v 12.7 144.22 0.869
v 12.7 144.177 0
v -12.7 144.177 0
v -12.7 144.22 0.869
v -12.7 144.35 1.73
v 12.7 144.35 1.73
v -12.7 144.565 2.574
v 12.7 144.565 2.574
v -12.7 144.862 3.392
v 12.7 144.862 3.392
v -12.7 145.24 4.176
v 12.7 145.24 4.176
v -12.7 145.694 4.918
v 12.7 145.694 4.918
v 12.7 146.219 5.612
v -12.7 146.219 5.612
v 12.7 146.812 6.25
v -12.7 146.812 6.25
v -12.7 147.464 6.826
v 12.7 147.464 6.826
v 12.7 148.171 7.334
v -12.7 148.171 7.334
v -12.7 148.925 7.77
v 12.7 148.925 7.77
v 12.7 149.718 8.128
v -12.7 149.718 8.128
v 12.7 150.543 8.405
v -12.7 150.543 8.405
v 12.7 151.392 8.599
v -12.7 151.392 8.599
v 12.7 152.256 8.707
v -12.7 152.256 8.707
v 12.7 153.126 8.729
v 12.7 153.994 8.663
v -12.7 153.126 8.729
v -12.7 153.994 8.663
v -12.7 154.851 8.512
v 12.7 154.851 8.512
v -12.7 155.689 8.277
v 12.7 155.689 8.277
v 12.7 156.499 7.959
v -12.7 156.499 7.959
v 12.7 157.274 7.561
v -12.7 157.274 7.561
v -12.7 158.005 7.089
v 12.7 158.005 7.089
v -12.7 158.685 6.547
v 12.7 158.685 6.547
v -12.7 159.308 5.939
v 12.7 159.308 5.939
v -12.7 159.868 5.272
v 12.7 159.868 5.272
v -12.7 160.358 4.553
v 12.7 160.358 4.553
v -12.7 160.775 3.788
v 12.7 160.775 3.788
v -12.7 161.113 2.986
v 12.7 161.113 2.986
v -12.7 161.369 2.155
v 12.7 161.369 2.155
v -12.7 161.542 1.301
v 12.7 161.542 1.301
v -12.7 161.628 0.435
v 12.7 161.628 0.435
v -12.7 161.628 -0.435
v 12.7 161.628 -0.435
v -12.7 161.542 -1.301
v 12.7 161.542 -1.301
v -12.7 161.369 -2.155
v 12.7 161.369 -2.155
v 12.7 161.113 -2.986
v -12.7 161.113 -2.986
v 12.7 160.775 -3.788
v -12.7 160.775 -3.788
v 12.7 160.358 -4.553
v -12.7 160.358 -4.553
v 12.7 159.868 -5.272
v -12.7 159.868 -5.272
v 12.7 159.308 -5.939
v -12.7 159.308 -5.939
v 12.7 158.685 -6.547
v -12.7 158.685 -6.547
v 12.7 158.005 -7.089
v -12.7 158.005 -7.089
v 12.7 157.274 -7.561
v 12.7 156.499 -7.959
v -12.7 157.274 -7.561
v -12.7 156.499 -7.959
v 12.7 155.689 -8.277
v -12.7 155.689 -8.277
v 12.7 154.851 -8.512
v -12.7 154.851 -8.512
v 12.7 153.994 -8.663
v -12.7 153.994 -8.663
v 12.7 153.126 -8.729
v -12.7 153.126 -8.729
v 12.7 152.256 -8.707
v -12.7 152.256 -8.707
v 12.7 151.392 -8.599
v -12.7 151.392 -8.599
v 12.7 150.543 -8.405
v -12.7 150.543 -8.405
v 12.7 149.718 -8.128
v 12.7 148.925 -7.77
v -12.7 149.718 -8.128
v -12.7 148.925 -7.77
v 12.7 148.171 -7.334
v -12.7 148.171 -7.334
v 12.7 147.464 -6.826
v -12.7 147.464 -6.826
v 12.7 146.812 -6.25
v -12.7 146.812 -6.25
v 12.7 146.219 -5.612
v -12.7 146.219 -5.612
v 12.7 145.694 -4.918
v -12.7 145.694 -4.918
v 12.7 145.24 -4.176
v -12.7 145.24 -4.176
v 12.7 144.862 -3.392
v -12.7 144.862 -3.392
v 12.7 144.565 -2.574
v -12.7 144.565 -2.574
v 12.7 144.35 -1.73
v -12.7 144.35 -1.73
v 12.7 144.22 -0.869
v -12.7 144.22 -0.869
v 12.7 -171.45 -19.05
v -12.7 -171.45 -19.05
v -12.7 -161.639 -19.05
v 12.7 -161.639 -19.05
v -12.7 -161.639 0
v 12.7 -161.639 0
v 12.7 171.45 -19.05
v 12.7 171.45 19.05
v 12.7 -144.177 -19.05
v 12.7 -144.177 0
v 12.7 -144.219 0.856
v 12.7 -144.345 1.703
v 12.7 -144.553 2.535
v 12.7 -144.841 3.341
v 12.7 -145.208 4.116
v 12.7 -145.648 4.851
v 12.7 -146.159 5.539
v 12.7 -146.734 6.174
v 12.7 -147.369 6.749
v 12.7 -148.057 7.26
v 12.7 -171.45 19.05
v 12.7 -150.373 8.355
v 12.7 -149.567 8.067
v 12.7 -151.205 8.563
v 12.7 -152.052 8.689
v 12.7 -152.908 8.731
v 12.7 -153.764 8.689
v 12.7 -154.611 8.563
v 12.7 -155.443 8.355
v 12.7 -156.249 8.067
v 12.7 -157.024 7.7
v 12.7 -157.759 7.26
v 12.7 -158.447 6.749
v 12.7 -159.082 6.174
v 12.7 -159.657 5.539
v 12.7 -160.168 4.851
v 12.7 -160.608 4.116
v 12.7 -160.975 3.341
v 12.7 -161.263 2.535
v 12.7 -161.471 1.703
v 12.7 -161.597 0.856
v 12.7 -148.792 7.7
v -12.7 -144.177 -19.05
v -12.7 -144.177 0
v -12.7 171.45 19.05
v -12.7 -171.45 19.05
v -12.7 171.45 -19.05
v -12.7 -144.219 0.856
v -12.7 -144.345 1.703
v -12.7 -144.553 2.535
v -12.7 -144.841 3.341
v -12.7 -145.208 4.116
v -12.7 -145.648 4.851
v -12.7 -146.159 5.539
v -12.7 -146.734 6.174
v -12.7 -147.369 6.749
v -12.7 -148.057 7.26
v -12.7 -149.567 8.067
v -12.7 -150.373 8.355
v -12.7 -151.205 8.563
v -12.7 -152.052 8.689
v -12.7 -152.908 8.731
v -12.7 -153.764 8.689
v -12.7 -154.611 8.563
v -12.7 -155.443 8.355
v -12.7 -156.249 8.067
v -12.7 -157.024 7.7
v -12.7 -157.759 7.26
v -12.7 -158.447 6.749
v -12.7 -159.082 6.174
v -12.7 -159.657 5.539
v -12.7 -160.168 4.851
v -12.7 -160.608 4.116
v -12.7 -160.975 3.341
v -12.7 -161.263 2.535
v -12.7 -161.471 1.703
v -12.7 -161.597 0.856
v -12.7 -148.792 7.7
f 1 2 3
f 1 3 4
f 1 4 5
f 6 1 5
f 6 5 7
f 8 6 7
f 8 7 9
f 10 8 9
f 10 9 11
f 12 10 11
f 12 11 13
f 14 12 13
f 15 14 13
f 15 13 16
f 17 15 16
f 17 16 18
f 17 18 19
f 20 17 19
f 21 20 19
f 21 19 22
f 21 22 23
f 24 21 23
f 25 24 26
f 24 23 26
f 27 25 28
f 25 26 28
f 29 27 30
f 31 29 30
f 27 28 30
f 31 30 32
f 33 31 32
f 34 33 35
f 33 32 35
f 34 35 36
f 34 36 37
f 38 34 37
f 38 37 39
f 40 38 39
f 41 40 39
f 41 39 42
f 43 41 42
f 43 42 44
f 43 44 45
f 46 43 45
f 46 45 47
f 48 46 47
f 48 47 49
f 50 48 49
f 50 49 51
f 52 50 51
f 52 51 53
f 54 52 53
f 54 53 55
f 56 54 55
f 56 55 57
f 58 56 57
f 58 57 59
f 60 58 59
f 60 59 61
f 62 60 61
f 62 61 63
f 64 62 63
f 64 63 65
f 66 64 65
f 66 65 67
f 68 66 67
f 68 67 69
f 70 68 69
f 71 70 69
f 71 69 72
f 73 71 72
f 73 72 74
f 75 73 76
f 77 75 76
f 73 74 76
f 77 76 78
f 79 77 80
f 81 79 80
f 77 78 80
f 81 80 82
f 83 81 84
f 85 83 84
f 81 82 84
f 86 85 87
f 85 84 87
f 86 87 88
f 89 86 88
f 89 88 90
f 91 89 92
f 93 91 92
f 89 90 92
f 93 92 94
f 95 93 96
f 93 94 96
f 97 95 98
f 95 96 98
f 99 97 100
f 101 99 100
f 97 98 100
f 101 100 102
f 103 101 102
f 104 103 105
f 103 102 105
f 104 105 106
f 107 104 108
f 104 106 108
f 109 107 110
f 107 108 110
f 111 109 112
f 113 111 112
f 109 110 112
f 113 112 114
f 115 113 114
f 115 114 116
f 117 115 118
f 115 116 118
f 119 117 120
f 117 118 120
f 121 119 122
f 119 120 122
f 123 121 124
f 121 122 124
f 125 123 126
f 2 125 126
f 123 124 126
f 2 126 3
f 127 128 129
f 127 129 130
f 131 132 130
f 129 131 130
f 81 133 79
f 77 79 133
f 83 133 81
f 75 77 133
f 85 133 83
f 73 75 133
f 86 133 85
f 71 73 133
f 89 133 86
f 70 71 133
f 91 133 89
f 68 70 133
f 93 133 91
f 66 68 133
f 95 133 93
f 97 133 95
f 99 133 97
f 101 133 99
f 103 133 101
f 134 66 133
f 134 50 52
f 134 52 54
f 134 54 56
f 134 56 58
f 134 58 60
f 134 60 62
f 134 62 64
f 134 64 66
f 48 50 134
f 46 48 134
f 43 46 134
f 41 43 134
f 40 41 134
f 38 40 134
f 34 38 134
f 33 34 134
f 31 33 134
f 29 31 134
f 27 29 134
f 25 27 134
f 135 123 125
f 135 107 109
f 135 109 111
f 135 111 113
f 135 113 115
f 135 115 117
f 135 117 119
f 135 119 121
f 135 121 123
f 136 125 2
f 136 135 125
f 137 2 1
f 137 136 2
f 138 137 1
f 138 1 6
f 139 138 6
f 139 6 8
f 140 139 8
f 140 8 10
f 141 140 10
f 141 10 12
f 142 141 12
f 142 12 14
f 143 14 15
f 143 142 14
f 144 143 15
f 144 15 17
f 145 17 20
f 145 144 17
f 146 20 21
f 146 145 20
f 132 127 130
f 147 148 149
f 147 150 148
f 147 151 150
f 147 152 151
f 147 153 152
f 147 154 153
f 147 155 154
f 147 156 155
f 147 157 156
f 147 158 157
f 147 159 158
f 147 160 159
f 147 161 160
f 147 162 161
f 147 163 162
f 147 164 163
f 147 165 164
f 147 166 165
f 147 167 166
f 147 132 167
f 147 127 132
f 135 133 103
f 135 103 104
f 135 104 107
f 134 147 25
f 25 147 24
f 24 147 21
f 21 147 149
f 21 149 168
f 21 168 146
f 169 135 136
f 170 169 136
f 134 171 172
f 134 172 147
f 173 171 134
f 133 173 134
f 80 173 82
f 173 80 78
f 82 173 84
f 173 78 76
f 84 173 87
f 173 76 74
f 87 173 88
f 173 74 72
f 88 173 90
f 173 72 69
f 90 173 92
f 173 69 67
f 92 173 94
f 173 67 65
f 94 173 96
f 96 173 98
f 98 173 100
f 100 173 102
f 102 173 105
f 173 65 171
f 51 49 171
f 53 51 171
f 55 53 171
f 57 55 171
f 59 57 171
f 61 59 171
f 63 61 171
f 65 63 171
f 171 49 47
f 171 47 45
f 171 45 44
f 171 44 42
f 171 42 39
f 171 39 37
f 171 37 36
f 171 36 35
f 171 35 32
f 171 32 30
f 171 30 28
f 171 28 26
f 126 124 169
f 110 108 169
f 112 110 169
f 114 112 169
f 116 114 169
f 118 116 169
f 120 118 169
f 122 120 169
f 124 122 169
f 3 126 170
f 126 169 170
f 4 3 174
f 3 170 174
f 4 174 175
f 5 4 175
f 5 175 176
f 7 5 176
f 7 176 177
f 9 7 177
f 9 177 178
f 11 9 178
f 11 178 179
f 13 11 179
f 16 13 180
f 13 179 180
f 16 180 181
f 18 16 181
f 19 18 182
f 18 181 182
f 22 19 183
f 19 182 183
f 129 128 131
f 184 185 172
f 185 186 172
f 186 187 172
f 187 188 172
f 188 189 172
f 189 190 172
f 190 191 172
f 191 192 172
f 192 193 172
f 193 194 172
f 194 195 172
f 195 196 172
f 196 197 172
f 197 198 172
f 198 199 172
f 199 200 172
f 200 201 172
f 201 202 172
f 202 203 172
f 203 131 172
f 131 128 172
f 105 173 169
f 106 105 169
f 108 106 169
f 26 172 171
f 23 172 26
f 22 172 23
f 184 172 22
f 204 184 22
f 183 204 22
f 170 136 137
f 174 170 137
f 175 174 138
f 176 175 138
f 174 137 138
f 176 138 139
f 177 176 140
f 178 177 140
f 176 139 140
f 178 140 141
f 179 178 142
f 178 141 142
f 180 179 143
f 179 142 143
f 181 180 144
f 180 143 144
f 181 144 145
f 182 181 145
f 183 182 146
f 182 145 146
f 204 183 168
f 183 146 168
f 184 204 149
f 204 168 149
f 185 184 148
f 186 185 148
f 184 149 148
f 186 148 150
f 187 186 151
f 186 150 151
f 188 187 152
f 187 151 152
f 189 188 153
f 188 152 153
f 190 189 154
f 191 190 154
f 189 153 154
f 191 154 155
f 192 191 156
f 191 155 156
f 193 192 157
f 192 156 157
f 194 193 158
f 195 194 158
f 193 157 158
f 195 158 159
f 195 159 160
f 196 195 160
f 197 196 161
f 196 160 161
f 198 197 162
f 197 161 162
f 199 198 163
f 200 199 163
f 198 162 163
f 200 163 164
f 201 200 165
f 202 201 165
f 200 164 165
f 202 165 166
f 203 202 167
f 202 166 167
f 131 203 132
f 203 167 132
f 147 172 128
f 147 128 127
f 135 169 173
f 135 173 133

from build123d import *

# Parameters (mm, degrees)
F0_W          = 25.4
F0_H          = 38.1
F1_DEPTH      = 171.45
F1_DEPTH_BACK = 171.45
F3_D          = 17.4625
F5_DEPTH      = 25.4


with BuildPart() as f1:
    # F0 (on Front) → F1 (new body, two sides)
    with BuildSketch(Plane.XZ) as f1_sk:
        Rectangle(F0_W, F0_H)
    extrude(amount=F1_DEPTH)
    extrude(f1_sk.sketch, amount=-F1_DEPTH_BACK)

    # F3 (through all)
    with Locations(Plane.YZ.offset(12.7)):
        with Locations((152.908, 0)):
            Hole(F3_D / 2)

    # F4 (on face) → F5 (cut)
    with BuildSketch(Plane.YZ.offset(12.7)):
        with BuildLine():
            Line((-144.17675, -19.05), (-144.17675, 0))
            ThreePointArc((-144.17675, 0), (-152.908, 8.73125), (-161.63925, 0))
            Line((-161.63925, 0), (-161.63925, -19.05))
            Line((-161.63925, -19.05), (-144.17675, -19.05))
        make_face()
    extrude(amount=-F5_DEPTH, mode=Mode.SUBTRACT)


solid = f1.part
